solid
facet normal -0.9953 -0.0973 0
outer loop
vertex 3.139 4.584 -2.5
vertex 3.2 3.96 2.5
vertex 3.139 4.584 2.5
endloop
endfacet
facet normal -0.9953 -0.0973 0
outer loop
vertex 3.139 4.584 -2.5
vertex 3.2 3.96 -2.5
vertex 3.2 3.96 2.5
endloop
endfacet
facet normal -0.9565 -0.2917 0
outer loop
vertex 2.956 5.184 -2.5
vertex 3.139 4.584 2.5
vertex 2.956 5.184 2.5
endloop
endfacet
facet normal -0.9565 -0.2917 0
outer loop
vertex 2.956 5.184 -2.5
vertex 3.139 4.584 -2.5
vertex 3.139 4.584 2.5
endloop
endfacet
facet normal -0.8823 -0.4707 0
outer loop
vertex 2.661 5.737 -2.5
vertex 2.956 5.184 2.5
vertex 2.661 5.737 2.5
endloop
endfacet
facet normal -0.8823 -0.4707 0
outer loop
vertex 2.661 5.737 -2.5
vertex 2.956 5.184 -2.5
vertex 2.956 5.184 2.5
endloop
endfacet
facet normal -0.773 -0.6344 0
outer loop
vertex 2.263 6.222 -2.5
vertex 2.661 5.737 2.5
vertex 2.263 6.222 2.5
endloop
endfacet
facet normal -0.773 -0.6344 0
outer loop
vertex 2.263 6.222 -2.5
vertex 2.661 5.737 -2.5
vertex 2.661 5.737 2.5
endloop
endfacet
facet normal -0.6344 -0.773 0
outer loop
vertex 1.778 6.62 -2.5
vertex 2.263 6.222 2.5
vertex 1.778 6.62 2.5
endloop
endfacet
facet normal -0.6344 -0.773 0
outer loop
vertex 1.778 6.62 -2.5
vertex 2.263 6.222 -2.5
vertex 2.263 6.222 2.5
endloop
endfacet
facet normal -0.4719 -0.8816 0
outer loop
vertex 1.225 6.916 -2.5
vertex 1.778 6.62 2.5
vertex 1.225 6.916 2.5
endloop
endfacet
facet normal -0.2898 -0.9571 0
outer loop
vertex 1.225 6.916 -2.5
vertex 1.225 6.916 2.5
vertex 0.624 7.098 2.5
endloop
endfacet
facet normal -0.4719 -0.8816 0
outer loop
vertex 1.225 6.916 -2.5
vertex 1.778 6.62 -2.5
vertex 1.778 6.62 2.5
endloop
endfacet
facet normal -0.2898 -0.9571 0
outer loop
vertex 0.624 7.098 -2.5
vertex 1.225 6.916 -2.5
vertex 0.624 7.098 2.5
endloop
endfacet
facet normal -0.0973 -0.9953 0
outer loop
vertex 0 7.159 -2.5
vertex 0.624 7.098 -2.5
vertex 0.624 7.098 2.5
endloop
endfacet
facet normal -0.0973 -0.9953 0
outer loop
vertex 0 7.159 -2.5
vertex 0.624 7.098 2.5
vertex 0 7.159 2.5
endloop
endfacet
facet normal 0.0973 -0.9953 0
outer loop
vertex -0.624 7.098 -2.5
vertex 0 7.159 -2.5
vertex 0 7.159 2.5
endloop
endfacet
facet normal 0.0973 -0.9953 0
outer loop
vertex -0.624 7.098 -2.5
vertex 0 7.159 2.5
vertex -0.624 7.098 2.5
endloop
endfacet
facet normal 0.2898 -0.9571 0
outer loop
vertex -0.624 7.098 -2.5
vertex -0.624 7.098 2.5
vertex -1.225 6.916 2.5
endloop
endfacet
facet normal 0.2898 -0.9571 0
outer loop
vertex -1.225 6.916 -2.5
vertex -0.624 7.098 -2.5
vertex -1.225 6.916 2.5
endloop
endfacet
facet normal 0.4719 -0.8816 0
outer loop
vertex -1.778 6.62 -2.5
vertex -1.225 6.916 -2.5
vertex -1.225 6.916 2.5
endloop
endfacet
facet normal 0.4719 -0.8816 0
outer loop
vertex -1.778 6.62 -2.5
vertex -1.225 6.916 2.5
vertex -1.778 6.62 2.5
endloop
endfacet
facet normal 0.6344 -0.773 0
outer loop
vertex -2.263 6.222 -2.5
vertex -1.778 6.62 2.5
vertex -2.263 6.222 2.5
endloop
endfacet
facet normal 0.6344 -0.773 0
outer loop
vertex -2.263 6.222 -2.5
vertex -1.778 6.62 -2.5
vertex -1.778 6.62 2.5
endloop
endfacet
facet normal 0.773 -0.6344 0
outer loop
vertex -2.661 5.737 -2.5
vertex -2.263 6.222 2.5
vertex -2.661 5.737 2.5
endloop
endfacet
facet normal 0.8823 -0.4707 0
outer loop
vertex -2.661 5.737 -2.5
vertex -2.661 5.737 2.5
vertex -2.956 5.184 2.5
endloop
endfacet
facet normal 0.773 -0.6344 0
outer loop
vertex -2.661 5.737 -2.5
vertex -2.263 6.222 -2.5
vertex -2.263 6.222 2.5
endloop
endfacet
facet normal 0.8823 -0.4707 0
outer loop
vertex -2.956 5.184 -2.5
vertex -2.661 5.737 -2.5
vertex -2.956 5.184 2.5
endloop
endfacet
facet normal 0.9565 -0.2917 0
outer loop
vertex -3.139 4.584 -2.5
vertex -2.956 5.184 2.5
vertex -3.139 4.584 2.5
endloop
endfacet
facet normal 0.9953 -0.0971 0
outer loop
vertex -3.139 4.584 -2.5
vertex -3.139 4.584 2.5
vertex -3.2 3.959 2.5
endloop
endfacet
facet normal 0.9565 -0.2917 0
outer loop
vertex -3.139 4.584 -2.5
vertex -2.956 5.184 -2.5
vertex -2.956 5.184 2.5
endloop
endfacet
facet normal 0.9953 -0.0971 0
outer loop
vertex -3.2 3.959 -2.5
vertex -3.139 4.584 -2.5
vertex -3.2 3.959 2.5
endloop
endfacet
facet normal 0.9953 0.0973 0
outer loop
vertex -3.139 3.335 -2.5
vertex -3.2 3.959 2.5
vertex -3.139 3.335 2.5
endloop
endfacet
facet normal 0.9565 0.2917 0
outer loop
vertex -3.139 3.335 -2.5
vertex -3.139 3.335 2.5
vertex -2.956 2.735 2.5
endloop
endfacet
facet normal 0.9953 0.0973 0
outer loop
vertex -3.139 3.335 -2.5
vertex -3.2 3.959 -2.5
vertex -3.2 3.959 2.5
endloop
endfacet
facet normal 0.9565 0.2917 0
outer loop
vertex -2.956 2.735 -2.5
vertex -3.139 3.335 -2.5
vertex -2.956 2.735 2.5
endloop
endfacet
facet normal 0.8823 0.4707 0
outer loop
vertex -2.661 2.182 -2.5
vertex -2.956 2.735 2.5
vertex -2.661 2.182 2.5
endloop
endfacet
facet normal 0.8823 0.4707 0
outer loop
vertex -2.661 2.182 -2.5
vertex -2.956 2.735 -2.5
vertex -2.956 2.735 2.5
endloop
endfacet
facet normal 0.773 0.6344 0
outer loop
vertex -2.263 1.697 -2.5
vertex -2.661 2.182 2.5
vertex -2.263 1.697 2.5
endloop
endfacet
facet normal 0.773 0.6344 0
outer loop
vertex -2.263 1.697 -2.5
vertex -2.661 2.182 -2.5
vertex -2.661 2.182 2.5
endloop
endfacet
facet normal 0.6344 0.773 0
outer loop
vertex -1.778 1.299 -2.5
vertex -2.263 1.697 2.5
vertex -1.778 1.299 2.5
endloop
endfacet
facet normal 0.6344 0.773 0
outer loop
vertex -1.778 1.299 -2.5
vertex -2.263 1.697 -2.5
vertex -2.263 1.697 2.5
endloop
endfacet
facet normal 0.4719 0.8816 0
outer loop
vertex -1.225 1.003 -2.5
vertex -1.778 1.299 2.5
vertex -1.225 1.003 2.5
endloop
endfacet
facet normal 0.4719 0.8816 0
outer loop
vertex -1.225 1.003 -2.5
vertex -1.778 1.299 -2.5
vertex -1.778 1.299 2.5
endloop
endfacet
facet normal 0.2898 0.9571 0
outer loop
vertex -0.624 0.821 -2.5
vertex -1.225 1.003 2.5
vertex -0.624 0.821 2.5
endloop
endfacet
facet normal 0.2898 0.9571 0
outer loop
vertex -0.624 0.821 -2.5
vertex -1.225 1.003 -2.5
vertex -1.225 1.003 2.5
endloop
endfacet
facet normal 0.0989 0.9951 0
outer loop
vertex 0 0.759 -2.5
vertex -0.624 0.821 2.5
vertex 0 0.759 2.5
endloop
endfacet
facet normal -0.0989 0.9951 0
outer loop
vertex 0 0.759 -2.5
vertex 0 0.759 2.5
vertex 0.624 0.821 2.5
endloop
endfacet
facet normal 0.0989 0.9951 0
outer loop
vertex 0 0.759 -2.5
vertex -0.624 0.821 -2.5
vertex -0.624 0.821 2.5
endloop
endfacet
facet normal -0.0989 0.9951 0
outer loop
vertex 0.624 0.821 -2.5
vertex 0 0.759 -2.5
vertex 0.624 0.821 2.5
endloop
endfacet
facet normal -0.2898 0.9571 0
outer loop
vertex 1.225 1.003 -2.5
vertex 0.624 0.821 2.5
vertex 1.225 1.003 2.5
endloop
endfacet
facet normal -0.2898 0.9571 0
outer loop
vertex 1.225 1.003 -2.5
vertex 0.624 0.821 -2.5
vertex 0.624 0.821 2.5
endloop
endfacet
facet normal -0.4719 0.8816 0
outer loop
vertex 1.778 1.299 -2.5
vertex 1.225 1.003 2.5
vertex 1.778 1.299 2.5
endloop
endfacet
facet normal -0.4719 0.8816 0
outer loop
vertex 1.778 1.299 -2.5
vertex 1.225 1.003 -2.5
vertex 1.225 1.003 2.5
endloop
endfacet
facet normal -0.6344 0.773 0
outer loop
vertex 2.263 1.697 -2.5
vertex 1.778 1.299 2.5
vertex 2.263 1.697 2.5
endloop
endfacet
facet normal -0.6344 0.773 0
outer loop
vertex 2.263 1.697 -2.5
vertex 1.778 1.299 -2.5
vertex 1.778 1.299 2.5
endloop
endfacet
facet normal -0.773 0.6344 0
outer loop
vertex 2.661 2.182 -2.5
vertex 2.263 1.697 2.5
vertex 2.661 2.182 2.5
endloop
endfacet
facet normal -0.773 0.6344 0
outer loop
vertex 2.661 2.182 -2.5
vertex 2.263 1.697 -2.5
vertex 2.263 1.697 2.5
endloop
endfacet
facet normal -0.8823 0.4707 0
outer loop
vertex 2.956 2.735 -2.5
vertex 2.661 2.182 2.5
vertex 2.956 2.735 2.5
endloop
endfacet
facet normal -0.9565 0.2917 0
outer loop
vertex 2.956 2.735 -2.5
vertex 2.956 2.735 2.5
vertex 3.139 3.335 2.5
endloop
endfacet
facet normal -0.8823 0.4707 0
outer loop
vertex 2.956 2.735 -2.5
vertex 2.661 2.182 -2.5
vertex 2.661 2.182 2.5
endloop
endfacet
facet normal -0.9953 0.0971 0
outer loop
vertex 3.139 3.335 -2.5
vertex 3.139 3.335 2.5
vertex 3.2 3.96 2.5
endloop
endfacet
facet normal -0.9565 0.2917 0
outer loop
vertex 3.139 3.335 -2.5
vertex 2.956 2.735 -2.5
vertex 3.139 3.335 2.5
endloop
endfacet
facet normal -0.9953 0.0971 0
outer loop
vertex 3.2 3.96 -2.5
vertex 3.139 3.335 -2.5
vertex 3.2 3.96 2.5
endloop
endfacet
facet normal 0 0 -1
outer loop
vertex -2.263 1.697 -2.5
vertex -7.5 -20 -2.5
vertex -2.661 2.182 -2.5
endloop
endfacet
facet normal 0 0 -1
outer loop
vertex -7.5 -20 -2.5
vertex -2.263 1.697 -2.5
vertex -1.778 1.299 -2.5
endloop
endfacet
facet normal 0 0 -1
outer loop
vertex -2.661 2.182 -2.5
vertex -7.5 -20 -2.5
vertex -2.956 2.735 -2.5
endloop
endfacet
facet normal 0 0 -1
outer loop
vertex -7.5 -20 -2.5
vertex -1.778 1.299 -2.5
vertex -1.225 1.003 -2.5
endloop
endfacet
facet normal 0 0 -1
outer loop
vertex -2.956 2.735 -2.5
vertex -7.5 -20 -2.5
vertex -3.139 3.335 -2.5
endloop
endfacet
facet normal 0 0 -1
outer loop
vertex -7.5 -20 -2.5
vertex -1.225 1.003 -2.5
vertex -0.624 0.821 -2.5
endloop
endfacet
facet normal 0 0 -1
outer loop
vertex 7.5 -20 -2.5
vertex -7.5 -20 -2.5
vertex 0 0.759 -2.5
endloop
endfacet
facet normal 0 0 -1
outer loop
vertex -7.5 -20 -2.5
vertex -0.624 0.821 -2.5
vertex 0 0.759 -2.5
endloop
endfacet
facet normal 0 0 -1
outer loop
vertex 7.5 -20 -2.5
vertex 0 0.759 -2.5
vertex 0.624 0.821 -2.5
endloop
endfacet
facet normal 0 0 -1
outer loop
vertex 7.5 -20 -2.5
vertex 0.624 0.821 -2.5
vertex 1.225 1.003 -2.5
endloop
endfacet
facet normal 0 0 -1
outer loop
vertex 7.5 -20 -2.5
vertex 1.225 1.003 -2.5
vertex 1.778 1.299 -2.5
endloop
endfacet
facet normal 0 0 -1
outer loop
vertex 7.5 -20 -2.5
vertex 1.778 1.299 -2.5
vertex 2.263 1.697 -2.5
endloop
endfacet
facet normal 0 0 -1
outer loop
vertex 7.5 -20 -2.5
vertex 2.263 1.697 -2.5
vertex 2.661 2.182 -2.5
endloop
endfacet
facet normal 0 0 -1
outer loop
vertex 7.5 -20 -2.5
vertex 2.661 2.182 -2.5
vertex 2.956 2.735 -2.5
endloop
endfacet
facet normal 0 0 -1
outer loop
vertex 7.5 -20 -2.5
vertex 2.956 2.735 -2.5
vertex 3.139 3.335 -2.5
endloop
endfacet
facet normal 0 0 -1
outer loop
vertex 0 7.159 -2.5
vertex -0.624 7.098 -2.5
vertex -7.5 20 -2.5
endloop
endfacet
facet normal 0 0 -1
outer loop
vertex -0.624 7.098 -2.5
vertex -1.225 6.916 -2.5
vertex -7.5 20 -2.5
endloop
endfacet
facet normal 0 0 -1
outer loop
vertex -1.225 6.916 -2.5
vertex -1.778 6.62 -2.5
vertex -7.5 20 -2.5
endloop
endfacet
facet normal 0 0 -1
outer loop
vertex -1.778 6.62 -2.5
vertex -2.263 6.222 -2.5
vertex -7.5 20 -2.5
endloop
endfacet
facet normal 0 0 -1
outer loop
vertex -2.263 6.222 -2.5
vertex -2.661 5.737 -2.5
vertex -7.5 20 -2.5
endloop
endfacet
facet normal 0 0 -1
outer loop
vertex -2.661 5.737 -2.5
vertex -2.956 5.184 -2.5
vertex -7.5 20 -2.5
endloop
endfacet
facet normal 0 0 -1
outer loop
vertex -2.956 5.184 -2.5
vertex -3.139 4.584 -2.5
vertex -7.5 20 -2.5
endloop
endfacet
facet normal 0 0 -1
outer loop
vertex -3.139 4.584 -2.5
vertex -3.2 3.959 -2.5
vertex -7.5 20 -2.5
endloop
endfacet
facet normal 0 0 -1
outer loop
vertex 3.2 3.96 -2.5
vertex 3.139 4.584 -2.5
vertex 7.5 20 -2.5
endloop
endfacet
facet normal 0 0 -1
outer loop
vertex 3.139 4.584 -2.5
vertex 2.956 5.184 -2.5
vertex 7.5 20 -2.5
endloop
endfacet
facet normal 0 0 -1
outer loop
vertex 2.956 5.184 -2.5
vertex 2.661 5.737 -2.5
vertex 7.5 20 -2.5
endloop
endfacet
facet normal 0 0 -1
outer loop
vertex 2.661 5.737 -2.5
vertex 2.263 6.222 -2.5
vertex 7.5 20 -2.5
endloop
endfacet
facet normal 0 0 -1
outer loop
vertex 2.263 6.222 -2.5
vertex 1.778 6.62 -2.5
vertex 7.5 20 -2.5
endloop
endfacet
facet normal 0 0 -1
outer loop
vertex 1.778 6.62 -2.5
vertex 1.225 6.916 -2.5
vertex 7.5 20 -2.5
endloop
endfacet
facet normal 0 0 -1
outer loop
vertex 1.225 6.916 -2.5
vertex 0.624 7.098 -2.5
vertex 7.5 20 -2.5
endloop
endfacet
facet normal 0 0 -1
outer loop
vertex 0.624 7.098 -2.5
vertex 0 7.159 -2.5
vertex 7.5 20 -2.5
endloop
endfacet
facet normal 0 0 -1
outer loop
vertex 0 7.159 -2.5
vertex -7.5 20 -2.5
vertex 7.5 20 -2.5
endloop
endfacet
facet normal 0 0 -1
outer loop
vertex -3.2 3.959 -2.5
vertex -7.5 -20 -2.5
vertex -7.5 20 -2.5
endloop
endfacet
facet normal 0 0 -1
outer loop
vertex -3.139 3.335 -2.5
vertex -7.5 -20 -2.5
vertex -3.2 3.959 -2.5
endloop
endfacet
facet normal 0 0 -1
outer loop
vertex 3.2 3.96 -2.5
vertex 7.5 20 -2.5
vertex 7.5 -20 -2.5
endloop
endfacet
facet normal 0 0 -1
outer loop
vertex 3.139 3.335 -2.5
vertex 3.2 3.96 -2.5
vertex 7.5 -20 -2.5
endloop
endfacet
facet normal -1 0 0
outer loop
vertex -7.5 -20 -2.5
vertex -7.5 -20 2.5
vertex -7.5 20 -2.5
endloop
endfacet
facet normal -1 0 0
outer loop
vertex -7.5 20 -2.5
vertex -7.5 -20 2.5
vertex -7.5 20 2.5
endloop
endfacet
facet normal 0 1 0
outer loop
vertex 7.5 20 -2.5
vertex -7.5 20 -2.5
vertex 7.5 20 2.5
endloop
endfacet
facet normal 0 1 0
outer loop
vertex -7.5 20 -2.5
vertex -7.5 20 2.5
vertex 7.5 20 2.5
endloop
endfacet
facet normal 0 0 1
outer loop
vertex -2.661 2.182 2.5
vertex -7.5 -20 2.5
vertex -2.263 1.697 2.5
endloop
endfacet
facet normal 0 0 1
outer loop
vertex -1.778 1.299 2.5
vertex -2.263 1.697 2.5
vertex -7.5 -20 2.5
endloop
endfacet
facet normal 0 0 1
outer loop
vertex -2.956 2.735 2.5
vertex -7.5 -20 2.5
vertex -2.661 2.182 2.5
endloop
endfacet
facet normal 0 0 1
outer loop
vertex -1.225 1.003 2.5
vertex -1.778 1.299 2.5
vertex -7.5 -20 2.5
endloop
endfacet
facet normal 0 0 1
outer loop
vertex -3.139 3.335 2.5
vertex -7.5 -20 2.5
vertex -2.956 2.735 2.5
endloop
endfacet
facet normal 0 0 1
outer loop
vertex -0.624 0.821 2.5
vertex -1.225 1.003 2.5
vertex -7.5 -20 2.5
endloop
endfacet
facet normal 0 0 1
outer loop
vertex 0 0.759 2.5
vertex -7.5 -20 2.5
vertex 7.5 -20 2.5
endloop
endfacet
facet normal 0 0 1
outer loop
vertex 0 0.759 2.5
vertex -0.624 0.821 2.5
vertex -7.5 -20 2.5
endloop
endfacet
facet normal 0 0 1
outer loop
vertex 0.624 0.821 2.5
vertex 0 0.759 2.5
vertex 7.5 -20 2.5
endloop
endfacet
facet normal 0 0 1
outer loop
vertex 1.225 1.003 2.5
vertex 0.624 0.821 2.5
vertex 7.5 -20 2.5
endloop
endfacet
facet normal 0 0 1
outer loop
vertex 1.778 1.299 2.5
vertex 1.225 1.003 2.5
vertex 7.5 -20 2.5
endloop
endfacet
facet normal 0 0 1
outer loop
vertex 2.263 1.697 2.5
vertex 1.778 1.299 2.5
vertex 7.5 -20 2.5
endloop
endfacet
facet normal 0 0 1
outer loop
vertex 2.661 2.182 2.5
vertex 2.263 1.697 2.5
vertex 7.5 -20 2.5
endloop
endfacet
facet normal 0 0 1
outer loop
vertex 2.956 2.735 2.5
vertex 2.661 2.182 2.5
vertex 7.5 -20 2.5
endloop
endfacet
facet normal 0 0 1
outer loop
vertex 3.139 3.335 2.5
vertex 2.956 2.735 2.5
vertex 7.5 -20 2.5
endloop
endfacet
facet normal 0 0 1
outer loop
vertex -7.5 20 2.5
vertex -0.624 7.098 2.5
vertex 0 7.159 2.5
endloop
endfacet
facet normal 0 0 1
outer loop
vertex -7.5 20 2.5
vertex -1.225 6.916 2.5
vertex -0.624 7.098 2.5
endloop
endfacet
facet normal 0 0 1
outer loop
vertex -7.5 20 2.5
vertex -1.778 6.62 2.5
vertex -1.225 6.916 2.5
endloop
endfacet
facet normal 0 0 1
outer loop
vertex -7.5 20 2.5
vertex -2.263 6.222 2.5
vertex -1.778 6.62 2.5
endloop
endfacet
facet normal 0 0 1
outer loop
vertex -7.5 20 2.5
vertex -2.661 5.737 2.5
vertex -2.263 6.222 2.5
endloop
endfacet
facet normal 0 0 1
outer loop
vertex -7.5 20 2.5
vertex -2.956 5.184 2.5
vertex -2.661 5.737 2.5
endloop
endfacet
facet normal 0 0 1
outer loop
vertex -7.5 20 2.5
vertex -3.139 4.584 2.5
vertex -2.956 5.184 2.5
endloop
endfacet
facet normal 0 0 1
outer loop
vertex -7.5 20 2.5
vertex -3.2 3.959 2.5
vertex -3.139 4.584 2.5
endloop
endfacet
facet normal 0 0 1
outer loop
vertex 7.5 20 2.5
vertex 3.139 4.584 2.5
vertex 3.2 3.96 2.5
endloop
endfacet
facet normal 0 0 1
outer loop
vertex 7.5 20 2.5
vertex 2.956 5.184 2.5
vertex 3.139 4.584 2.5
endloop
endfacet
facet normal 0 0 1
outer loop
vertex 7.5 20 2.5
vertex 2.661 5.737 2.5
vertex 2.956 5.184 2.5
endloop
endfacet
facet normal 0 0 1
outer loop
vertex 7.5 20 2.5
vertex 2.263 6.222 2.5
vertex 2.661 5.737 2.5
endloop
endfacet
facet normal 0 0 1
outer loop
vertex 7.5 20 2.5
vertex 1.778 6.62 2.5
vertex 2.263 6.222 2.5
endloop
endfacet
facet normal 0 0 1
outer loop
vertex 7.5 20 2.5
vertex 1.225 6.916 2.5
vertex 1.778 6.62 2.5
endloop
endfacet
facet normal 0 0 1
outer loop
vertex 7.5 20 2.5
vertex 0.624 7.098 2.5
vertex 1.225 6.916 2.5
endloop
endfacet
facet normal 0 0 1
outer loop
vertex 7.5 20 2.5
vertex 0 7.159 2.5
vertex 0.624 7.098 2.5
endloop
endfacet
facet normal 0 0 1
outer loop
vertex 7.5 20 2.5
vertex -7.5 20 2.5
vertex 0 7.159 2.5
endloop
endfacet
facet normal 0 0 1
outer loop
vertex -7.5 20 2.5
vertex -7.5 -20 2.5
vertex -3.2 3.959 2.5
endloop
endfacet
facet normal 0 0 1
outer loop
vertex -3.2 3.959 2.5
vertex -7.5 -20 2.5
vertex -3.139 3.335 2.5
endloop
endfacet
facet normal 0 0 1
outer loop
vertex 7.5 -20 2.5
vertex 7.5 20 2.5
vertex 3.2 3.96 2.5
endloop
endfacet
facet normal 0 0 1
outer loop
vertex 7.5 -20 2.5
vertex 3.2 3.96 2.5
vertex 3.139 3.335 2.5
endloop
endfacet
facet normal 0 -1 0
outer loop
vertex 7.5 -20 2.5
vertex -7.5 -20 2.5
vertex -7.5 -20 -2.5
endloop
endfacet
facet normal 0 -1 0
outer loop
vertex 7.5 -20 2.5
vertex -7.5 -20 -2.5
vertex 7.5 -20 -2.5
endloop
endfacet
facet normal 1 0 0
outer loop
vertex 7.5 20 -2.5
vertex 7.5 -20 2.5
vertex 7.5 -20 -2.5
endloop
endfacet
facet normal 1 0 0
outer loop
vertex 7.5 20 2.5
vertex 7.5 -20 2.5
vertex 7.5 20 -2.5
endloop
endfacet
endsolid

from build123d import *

# Parameters (mm, degrees)
SKETCH1_W           = 15
SKETCH1_H           = 40
SKETCH1_R           = 3.2
BOSS_EXTRUDE1_DEPTH = 2.5


with BuildPart() as part:
    # Sketch1 → Boss-Extrude1 (new body, symmetric)
    with BuildSketch(Plane.XY):
        Rectangle(SKETCH1_W, SKETCH1_H)
        with Locations((0, 3.9595)):
            Circle(SKETCH1_R, mode=Mode.SUBTRACT)
    extrude(amount=BOSS_EXTRUDE1_DEPTH, both=True)


solid = part.part
